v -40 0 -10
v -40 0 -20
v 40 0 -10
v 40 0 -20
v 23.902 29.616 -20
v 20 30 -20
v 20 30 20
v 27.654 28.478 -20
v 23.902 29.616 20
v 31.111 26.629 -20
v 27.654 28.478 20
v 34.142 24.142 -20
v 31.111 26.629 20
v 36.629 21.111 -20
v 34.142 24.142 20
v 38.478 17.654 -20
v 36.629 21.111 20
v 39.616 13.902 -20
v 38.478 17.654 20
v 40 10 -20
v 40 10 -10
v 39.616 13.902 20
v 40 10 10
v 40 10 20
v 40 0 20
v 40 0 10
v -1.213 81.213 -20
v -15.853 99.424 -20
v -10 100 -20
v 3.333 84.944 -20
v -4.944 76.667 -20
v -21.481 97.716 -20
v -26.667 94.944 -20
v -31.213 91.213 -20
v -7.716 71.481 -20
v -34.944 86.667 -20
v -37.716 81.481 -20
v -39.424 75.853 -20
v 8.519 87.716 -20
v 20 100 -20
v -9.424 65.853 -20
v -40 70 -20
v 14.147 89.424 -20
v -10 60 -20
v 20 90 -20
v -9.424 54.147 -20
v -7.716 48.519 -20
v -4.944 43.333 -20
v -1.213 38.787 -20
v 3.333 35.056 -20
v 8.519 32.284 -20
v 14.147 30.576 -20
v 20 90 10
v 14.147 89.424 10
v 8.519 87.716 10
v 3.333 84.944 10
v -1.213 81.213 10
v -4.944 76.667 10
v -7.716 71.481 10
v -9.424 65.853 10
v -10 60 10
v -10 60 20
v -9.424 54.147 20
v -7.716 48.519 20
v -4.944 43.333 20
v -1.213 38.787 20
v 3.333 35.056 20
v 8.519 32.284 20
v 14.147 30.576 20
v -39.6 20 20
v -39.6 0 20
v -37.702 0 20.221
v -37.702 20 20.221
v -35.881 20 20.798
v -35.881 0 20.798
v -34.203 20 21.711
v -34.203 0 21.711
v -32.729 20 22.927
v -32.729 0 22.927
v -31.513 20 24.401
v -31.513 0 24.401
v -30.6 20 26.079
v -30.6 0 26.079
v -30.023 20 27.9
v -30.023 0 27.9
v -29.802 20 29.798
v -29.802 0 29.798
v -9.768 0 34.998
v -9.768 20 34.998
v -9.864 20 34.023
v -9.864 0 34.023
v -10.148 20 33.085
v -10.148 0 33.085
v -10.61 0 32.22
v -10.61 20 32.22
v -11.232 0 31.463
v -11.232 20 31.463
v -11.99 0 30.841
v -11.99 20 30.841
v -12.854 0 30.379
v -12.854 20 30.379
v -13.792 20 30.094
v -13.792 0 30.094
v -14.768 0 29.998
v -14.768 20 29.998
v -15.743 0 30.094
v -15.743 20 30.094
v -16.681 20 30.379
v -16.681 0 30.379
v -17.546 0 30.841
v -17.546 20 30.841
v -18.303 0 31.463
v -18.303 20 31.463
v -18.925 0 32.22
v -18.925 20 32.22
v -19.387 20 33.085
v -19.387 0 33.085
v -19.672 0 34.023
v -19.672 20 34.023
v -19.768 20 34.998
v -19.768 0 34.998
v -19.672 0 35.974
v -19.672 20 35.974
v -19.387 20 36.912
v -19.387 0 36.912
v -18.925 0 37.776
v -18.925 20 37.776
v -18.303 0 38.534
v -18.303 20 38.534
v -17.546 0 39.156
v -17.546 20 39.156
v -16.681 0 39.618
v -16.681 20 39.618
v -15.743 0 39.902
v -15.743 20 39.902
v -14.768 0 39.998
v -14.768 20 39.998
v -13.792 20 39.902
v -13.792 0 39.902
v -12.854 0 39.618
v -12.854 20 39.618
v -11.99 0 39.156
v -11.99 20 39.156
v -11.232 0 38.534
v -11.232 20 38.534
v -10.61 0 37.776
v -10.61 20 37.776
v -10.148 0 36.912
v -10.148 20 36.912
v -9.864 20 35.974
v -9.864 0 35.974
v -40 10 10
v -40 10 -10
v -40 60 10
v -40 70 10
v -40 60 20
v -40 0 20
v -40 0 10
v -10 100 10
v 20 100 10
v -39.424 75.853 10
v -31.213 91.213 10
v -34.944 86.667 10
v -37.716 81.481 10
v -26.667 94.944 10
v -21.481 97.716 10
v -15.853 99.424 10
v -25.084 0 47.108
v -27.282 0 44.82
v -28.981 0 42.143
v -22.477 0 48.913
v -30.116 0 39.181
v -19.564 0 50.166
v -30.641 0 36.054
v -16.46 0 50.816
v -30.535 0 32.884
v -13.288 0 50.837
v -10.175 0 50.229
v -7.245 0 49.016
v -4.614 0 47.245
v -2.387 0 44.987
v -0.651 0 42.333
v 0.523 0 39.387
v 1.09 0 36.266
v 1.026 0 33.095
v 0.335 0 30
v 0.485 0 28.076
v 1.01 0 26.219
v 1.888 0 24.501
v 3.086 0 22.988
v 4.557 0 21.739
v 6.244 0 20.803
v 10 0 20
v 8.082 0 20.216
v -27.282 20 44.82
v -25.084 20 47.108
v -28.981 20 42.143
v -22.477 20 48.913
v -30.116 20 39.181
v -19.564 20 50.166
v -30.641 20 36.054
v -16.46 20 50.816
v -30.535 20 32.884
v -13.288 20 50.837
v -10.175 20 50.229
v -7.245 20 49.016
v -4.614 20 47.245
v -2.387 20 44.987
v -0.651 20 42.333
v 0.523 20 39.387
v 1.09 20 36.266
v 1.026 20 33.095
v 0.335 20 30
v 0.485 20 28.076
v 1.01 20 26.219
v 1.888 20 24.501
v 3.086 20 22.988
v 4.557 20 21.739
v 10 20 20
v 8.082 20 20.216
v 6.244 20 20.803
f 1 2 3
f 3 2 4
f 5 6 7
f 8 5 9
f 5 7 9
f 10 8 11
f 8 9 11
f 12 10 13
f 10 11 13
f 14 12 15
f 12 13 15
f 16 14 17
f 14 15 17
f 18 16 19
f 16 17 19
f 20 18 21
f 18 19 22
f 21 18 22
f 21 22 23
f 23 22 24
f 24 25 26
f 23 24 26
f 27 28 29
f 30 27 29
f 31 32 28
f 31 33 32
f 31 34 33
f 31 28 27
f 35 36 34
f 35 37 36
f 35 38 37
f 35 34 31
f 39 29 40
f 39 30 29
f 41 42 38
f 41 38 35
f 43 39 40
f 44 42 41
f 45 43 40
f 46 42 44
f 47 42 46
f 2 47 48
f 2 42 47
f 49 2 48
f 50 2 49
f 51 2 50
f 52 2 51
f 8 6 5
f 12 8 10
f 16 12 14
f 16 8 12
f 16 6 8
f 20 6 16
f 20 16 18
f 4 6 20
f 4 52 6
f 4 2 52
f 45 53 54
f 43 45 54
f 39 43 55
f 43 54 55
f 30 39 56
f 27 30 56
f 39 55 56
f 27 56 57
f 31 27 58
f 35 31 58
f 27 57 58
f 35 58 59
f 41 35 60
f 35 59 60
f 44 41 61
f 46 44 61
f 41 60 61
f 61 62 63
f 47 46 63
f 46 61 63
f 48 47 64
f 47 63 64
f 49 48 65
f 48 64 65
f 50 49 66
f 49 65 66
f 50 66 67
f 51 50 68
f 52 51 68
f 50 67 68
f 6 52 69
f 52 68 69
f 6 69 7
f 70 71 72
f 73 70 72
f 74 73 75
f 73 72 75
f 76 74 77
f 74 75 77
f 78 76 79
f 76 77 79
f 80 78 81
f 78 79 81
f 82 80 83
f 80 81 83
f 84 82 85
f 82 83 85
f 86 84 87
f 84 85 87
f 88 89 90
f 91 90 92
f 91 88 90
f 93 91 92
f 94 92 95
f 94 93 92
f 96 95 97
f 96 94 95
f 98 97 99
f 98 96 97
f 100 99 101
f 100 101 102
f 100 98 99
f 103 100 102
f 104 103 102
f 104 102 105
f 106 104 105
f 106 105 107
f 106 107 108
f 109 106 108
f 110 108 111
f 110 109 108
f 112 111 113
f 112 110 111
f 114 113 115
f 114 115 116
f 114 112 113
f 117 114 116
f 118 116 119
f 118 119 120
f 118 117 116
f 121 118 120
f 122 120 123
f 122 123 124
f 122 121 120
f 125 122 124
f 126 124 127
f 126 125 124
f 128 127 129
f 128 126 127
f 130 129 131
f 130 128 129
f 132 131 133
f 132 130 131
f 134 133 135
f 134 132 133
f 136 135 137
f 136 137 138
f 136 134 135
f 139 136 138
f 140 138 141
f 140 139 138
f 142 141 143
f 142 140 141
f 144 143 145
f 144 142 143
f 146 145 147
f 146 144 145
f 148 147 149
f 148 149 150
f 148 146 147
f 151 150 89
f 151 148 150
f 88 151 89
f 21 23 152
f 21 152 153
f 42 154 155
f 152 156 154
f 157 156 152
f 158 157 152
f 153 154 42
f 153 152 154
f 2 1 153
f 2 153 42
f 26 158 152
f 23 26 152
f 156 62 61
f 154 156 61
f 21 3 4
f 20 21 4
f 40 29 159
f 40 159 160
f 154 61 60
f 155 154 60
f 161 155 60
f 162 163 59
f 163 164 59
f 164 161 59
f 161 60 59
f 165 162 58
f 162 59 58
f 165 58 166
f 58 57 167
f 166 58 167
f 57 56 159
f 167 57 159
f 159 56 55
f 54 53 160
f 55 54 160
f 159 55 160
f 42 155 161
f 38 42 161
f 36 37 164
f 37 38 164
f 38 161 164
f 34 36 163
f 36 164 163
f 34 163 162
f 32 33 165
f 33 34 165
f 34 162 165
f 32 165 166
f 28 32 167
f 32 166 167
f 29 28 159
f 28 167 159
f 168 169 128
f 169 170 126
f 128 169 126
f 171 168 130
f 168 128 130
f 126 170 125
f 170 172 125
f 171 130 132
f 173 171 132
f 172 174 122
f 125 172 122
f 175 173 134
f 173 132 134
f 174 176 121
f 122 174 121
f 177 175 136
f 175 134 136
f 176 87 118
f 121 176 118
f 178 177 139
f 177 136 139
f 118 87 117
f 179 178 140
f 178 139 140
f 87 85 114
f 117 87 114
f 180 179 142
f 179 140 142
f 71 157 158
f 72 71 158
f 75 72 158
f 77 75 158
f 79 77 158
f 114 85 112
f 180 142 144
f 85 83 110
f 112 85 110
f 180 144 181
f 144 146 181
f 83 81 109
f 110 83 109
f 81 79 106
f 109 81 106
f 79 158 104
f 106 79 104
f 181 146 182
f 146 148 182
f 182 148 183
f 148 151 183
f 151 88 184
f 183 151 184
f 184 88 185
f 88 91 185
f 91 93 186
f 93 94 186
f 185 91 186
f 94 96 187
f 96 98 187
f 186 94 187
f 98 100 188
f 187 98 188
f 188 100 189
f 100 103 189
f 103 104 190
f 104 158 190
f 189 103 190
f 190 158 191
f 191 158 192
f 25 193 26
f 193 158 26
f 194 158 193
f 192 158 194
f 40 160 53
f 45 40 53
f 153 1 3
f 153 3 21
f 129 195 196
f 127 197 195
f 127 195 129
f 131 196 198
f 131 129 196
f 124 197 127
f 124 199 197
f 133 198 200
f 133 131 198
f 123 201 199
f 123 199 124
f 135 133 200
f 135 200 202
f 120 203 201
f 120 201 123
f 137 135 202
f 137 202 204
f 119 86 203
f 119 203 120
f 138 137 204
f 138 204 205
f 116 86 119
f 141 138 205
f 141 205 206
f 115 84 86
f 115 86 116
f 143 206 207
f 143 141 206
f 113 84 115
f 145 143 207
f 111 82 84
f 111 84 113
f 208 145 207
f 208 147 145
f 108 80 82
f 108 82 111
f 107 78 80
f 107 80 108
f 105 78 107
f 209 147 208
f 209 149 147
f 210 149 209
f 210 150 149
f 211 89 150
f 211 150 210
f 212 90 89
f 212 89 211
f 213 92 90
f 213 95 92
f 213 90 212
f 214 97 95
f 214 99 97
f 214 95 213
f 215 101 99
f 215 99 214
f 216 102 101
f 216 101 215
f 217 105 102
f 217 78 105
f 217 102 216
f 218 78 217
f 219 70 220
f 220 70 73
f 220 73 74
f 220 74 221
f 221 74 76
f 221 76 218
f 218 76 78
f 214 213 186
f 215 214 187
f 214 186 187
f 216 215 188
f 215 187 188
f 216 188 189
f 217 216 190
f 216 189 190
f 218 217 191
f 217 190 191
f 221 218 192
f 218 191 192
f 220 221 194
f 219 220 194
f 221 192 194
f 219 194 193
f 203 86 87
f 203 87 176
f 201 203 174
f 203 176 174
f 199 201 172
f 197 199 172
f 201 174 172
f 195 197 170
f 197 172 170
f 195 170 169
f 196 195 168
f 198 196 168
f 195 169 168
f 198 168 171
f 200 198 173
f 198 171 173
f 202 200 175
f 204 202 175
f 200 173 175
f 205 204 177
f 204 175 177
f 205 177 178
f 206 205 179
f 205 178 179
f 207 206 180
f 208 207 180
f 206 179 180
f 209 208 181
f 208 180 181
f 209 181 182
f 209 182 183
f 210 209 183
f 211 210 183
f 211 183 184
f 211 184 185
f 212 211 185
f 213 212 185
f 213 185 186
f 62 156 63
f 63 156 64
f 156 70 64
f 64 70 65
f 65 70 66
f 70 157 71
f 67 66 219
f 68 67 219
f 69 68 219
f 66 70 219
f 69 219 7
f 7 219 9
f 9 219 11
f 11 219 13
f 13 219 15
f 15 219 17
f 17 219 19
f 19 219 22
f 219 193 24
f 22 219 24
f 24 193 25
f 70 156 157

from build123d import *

# Parameters (mm, degrees)
SKETCH1_W           = 80
SKETCH1_H           = 40
BOSS_EXTRUDE1_DEPTH = 100
CUT_EXTRUDE1_DEPTH  = 100
SKETCH4_W           = 20
SKETCH4_H           = 10
CUT_EXTRUDE2_DEPTH  = 100
SKETCH5_W           = 10
SKETCH5_H           = 40
CUT_EXTRUDE3_DEPTH  = 100
SKETCH7_R           = 5
BOSS_EXTRUDE2_DEPTH = 20


with BuildPart() as part:
    # Sketch1 → Boss-Extrude1 (new body)
    with BuildSketch(Plane(origin=(0, 0, 0), x_dir=(1, 0, 0), z_dir=(0, 1, 0))):
        Rectangle(SKETCH1_W, SKETCH1_H)
    extrude(amount=BOSS_EXTRUDE1_DEPTH)

    # Sketch2 → Cut-Extrude1 (cut)
    with BuildSketch(Plane.XY.offset(20)):
        with BuildLine():
            ThreePointArc((20, 30), (34.142135624, 24.142135624), (40, 10))
            Line((40, 10), (40, 100))
            Line((40, 100), (20, 100))
            Line((20, 100), (20, 90))
            ThreePointArc((20, 90), (-10, 60), (20, 30))
        make_face()
        with BuildLine():
            Line((-40, 100), (-40, 70))
            ThreePointArc((-40, 70), (-31.213203436, 91.213203436), (-10, 100))
            Line((-10, 100), (-40, 100))
        make_face()
    extrude(amount=-CUT_EXTRUDE1_DEPTH, mode=Mode.SUBTRACT)

    # Sketch4 → Cut-Extrude2 (cut)
    with BuildSketch(Plane(origin=(40, 0, 0), x_dir=(0, 0, -1), z_dir=(1, 0, 0))):
        with Locations((0, 5)):
            Rectangle(SKETCH4_W, SKETCH4_H)
    extrude(amount=-CUT_EXTRUDE2_DEPTH, mode=Mode.SUBTRACT)

    # Sketch5 → Cut-Extrude3 (cut)
    with BuildSketch(Plane(origin=(20, 0, 0), x_dir=(0, 0, -1), z_dir=(1, 0, 0))):
        with Locations((-15, 80)):
            Rectangle(SKETCH5_W, SKETCH5_H)
    extrude(amount=-CUT_EXTRUDE3_DEPTH, mode=Mode.SUBTRACT)

    # Sketch7 → Boss-Extrude2 (add)
    with BuildSketch(Plane(origin=(0, 0, 0), x_dir=(1, 0, 0), z_dir=(0, 1, 0))):
        with BuildLine():
            Line((10, -20), (-39.600122702, -20))
            ThreePointArc((-39.600122702, -20), (-32.728993539, -22.926933215), (-29.802060324, -29.798062378))
            ThreePointArc((-29.802060324, -29.798062378), (-14.874330774, -50.906091293), (0.33492105, -30))
            ThreePointArc((0.33492105, -30), (3.085632278, -22.987896563), (10, -20))
        make_face()
        with Locations((-14.767737438, -34.998201696)):
            Circle(SKETCH7_R, mode=Mode.SUBTRACT)
    extrude(amount=BOSS_EXTRUDE2_DEPTH)


solid = part.part
